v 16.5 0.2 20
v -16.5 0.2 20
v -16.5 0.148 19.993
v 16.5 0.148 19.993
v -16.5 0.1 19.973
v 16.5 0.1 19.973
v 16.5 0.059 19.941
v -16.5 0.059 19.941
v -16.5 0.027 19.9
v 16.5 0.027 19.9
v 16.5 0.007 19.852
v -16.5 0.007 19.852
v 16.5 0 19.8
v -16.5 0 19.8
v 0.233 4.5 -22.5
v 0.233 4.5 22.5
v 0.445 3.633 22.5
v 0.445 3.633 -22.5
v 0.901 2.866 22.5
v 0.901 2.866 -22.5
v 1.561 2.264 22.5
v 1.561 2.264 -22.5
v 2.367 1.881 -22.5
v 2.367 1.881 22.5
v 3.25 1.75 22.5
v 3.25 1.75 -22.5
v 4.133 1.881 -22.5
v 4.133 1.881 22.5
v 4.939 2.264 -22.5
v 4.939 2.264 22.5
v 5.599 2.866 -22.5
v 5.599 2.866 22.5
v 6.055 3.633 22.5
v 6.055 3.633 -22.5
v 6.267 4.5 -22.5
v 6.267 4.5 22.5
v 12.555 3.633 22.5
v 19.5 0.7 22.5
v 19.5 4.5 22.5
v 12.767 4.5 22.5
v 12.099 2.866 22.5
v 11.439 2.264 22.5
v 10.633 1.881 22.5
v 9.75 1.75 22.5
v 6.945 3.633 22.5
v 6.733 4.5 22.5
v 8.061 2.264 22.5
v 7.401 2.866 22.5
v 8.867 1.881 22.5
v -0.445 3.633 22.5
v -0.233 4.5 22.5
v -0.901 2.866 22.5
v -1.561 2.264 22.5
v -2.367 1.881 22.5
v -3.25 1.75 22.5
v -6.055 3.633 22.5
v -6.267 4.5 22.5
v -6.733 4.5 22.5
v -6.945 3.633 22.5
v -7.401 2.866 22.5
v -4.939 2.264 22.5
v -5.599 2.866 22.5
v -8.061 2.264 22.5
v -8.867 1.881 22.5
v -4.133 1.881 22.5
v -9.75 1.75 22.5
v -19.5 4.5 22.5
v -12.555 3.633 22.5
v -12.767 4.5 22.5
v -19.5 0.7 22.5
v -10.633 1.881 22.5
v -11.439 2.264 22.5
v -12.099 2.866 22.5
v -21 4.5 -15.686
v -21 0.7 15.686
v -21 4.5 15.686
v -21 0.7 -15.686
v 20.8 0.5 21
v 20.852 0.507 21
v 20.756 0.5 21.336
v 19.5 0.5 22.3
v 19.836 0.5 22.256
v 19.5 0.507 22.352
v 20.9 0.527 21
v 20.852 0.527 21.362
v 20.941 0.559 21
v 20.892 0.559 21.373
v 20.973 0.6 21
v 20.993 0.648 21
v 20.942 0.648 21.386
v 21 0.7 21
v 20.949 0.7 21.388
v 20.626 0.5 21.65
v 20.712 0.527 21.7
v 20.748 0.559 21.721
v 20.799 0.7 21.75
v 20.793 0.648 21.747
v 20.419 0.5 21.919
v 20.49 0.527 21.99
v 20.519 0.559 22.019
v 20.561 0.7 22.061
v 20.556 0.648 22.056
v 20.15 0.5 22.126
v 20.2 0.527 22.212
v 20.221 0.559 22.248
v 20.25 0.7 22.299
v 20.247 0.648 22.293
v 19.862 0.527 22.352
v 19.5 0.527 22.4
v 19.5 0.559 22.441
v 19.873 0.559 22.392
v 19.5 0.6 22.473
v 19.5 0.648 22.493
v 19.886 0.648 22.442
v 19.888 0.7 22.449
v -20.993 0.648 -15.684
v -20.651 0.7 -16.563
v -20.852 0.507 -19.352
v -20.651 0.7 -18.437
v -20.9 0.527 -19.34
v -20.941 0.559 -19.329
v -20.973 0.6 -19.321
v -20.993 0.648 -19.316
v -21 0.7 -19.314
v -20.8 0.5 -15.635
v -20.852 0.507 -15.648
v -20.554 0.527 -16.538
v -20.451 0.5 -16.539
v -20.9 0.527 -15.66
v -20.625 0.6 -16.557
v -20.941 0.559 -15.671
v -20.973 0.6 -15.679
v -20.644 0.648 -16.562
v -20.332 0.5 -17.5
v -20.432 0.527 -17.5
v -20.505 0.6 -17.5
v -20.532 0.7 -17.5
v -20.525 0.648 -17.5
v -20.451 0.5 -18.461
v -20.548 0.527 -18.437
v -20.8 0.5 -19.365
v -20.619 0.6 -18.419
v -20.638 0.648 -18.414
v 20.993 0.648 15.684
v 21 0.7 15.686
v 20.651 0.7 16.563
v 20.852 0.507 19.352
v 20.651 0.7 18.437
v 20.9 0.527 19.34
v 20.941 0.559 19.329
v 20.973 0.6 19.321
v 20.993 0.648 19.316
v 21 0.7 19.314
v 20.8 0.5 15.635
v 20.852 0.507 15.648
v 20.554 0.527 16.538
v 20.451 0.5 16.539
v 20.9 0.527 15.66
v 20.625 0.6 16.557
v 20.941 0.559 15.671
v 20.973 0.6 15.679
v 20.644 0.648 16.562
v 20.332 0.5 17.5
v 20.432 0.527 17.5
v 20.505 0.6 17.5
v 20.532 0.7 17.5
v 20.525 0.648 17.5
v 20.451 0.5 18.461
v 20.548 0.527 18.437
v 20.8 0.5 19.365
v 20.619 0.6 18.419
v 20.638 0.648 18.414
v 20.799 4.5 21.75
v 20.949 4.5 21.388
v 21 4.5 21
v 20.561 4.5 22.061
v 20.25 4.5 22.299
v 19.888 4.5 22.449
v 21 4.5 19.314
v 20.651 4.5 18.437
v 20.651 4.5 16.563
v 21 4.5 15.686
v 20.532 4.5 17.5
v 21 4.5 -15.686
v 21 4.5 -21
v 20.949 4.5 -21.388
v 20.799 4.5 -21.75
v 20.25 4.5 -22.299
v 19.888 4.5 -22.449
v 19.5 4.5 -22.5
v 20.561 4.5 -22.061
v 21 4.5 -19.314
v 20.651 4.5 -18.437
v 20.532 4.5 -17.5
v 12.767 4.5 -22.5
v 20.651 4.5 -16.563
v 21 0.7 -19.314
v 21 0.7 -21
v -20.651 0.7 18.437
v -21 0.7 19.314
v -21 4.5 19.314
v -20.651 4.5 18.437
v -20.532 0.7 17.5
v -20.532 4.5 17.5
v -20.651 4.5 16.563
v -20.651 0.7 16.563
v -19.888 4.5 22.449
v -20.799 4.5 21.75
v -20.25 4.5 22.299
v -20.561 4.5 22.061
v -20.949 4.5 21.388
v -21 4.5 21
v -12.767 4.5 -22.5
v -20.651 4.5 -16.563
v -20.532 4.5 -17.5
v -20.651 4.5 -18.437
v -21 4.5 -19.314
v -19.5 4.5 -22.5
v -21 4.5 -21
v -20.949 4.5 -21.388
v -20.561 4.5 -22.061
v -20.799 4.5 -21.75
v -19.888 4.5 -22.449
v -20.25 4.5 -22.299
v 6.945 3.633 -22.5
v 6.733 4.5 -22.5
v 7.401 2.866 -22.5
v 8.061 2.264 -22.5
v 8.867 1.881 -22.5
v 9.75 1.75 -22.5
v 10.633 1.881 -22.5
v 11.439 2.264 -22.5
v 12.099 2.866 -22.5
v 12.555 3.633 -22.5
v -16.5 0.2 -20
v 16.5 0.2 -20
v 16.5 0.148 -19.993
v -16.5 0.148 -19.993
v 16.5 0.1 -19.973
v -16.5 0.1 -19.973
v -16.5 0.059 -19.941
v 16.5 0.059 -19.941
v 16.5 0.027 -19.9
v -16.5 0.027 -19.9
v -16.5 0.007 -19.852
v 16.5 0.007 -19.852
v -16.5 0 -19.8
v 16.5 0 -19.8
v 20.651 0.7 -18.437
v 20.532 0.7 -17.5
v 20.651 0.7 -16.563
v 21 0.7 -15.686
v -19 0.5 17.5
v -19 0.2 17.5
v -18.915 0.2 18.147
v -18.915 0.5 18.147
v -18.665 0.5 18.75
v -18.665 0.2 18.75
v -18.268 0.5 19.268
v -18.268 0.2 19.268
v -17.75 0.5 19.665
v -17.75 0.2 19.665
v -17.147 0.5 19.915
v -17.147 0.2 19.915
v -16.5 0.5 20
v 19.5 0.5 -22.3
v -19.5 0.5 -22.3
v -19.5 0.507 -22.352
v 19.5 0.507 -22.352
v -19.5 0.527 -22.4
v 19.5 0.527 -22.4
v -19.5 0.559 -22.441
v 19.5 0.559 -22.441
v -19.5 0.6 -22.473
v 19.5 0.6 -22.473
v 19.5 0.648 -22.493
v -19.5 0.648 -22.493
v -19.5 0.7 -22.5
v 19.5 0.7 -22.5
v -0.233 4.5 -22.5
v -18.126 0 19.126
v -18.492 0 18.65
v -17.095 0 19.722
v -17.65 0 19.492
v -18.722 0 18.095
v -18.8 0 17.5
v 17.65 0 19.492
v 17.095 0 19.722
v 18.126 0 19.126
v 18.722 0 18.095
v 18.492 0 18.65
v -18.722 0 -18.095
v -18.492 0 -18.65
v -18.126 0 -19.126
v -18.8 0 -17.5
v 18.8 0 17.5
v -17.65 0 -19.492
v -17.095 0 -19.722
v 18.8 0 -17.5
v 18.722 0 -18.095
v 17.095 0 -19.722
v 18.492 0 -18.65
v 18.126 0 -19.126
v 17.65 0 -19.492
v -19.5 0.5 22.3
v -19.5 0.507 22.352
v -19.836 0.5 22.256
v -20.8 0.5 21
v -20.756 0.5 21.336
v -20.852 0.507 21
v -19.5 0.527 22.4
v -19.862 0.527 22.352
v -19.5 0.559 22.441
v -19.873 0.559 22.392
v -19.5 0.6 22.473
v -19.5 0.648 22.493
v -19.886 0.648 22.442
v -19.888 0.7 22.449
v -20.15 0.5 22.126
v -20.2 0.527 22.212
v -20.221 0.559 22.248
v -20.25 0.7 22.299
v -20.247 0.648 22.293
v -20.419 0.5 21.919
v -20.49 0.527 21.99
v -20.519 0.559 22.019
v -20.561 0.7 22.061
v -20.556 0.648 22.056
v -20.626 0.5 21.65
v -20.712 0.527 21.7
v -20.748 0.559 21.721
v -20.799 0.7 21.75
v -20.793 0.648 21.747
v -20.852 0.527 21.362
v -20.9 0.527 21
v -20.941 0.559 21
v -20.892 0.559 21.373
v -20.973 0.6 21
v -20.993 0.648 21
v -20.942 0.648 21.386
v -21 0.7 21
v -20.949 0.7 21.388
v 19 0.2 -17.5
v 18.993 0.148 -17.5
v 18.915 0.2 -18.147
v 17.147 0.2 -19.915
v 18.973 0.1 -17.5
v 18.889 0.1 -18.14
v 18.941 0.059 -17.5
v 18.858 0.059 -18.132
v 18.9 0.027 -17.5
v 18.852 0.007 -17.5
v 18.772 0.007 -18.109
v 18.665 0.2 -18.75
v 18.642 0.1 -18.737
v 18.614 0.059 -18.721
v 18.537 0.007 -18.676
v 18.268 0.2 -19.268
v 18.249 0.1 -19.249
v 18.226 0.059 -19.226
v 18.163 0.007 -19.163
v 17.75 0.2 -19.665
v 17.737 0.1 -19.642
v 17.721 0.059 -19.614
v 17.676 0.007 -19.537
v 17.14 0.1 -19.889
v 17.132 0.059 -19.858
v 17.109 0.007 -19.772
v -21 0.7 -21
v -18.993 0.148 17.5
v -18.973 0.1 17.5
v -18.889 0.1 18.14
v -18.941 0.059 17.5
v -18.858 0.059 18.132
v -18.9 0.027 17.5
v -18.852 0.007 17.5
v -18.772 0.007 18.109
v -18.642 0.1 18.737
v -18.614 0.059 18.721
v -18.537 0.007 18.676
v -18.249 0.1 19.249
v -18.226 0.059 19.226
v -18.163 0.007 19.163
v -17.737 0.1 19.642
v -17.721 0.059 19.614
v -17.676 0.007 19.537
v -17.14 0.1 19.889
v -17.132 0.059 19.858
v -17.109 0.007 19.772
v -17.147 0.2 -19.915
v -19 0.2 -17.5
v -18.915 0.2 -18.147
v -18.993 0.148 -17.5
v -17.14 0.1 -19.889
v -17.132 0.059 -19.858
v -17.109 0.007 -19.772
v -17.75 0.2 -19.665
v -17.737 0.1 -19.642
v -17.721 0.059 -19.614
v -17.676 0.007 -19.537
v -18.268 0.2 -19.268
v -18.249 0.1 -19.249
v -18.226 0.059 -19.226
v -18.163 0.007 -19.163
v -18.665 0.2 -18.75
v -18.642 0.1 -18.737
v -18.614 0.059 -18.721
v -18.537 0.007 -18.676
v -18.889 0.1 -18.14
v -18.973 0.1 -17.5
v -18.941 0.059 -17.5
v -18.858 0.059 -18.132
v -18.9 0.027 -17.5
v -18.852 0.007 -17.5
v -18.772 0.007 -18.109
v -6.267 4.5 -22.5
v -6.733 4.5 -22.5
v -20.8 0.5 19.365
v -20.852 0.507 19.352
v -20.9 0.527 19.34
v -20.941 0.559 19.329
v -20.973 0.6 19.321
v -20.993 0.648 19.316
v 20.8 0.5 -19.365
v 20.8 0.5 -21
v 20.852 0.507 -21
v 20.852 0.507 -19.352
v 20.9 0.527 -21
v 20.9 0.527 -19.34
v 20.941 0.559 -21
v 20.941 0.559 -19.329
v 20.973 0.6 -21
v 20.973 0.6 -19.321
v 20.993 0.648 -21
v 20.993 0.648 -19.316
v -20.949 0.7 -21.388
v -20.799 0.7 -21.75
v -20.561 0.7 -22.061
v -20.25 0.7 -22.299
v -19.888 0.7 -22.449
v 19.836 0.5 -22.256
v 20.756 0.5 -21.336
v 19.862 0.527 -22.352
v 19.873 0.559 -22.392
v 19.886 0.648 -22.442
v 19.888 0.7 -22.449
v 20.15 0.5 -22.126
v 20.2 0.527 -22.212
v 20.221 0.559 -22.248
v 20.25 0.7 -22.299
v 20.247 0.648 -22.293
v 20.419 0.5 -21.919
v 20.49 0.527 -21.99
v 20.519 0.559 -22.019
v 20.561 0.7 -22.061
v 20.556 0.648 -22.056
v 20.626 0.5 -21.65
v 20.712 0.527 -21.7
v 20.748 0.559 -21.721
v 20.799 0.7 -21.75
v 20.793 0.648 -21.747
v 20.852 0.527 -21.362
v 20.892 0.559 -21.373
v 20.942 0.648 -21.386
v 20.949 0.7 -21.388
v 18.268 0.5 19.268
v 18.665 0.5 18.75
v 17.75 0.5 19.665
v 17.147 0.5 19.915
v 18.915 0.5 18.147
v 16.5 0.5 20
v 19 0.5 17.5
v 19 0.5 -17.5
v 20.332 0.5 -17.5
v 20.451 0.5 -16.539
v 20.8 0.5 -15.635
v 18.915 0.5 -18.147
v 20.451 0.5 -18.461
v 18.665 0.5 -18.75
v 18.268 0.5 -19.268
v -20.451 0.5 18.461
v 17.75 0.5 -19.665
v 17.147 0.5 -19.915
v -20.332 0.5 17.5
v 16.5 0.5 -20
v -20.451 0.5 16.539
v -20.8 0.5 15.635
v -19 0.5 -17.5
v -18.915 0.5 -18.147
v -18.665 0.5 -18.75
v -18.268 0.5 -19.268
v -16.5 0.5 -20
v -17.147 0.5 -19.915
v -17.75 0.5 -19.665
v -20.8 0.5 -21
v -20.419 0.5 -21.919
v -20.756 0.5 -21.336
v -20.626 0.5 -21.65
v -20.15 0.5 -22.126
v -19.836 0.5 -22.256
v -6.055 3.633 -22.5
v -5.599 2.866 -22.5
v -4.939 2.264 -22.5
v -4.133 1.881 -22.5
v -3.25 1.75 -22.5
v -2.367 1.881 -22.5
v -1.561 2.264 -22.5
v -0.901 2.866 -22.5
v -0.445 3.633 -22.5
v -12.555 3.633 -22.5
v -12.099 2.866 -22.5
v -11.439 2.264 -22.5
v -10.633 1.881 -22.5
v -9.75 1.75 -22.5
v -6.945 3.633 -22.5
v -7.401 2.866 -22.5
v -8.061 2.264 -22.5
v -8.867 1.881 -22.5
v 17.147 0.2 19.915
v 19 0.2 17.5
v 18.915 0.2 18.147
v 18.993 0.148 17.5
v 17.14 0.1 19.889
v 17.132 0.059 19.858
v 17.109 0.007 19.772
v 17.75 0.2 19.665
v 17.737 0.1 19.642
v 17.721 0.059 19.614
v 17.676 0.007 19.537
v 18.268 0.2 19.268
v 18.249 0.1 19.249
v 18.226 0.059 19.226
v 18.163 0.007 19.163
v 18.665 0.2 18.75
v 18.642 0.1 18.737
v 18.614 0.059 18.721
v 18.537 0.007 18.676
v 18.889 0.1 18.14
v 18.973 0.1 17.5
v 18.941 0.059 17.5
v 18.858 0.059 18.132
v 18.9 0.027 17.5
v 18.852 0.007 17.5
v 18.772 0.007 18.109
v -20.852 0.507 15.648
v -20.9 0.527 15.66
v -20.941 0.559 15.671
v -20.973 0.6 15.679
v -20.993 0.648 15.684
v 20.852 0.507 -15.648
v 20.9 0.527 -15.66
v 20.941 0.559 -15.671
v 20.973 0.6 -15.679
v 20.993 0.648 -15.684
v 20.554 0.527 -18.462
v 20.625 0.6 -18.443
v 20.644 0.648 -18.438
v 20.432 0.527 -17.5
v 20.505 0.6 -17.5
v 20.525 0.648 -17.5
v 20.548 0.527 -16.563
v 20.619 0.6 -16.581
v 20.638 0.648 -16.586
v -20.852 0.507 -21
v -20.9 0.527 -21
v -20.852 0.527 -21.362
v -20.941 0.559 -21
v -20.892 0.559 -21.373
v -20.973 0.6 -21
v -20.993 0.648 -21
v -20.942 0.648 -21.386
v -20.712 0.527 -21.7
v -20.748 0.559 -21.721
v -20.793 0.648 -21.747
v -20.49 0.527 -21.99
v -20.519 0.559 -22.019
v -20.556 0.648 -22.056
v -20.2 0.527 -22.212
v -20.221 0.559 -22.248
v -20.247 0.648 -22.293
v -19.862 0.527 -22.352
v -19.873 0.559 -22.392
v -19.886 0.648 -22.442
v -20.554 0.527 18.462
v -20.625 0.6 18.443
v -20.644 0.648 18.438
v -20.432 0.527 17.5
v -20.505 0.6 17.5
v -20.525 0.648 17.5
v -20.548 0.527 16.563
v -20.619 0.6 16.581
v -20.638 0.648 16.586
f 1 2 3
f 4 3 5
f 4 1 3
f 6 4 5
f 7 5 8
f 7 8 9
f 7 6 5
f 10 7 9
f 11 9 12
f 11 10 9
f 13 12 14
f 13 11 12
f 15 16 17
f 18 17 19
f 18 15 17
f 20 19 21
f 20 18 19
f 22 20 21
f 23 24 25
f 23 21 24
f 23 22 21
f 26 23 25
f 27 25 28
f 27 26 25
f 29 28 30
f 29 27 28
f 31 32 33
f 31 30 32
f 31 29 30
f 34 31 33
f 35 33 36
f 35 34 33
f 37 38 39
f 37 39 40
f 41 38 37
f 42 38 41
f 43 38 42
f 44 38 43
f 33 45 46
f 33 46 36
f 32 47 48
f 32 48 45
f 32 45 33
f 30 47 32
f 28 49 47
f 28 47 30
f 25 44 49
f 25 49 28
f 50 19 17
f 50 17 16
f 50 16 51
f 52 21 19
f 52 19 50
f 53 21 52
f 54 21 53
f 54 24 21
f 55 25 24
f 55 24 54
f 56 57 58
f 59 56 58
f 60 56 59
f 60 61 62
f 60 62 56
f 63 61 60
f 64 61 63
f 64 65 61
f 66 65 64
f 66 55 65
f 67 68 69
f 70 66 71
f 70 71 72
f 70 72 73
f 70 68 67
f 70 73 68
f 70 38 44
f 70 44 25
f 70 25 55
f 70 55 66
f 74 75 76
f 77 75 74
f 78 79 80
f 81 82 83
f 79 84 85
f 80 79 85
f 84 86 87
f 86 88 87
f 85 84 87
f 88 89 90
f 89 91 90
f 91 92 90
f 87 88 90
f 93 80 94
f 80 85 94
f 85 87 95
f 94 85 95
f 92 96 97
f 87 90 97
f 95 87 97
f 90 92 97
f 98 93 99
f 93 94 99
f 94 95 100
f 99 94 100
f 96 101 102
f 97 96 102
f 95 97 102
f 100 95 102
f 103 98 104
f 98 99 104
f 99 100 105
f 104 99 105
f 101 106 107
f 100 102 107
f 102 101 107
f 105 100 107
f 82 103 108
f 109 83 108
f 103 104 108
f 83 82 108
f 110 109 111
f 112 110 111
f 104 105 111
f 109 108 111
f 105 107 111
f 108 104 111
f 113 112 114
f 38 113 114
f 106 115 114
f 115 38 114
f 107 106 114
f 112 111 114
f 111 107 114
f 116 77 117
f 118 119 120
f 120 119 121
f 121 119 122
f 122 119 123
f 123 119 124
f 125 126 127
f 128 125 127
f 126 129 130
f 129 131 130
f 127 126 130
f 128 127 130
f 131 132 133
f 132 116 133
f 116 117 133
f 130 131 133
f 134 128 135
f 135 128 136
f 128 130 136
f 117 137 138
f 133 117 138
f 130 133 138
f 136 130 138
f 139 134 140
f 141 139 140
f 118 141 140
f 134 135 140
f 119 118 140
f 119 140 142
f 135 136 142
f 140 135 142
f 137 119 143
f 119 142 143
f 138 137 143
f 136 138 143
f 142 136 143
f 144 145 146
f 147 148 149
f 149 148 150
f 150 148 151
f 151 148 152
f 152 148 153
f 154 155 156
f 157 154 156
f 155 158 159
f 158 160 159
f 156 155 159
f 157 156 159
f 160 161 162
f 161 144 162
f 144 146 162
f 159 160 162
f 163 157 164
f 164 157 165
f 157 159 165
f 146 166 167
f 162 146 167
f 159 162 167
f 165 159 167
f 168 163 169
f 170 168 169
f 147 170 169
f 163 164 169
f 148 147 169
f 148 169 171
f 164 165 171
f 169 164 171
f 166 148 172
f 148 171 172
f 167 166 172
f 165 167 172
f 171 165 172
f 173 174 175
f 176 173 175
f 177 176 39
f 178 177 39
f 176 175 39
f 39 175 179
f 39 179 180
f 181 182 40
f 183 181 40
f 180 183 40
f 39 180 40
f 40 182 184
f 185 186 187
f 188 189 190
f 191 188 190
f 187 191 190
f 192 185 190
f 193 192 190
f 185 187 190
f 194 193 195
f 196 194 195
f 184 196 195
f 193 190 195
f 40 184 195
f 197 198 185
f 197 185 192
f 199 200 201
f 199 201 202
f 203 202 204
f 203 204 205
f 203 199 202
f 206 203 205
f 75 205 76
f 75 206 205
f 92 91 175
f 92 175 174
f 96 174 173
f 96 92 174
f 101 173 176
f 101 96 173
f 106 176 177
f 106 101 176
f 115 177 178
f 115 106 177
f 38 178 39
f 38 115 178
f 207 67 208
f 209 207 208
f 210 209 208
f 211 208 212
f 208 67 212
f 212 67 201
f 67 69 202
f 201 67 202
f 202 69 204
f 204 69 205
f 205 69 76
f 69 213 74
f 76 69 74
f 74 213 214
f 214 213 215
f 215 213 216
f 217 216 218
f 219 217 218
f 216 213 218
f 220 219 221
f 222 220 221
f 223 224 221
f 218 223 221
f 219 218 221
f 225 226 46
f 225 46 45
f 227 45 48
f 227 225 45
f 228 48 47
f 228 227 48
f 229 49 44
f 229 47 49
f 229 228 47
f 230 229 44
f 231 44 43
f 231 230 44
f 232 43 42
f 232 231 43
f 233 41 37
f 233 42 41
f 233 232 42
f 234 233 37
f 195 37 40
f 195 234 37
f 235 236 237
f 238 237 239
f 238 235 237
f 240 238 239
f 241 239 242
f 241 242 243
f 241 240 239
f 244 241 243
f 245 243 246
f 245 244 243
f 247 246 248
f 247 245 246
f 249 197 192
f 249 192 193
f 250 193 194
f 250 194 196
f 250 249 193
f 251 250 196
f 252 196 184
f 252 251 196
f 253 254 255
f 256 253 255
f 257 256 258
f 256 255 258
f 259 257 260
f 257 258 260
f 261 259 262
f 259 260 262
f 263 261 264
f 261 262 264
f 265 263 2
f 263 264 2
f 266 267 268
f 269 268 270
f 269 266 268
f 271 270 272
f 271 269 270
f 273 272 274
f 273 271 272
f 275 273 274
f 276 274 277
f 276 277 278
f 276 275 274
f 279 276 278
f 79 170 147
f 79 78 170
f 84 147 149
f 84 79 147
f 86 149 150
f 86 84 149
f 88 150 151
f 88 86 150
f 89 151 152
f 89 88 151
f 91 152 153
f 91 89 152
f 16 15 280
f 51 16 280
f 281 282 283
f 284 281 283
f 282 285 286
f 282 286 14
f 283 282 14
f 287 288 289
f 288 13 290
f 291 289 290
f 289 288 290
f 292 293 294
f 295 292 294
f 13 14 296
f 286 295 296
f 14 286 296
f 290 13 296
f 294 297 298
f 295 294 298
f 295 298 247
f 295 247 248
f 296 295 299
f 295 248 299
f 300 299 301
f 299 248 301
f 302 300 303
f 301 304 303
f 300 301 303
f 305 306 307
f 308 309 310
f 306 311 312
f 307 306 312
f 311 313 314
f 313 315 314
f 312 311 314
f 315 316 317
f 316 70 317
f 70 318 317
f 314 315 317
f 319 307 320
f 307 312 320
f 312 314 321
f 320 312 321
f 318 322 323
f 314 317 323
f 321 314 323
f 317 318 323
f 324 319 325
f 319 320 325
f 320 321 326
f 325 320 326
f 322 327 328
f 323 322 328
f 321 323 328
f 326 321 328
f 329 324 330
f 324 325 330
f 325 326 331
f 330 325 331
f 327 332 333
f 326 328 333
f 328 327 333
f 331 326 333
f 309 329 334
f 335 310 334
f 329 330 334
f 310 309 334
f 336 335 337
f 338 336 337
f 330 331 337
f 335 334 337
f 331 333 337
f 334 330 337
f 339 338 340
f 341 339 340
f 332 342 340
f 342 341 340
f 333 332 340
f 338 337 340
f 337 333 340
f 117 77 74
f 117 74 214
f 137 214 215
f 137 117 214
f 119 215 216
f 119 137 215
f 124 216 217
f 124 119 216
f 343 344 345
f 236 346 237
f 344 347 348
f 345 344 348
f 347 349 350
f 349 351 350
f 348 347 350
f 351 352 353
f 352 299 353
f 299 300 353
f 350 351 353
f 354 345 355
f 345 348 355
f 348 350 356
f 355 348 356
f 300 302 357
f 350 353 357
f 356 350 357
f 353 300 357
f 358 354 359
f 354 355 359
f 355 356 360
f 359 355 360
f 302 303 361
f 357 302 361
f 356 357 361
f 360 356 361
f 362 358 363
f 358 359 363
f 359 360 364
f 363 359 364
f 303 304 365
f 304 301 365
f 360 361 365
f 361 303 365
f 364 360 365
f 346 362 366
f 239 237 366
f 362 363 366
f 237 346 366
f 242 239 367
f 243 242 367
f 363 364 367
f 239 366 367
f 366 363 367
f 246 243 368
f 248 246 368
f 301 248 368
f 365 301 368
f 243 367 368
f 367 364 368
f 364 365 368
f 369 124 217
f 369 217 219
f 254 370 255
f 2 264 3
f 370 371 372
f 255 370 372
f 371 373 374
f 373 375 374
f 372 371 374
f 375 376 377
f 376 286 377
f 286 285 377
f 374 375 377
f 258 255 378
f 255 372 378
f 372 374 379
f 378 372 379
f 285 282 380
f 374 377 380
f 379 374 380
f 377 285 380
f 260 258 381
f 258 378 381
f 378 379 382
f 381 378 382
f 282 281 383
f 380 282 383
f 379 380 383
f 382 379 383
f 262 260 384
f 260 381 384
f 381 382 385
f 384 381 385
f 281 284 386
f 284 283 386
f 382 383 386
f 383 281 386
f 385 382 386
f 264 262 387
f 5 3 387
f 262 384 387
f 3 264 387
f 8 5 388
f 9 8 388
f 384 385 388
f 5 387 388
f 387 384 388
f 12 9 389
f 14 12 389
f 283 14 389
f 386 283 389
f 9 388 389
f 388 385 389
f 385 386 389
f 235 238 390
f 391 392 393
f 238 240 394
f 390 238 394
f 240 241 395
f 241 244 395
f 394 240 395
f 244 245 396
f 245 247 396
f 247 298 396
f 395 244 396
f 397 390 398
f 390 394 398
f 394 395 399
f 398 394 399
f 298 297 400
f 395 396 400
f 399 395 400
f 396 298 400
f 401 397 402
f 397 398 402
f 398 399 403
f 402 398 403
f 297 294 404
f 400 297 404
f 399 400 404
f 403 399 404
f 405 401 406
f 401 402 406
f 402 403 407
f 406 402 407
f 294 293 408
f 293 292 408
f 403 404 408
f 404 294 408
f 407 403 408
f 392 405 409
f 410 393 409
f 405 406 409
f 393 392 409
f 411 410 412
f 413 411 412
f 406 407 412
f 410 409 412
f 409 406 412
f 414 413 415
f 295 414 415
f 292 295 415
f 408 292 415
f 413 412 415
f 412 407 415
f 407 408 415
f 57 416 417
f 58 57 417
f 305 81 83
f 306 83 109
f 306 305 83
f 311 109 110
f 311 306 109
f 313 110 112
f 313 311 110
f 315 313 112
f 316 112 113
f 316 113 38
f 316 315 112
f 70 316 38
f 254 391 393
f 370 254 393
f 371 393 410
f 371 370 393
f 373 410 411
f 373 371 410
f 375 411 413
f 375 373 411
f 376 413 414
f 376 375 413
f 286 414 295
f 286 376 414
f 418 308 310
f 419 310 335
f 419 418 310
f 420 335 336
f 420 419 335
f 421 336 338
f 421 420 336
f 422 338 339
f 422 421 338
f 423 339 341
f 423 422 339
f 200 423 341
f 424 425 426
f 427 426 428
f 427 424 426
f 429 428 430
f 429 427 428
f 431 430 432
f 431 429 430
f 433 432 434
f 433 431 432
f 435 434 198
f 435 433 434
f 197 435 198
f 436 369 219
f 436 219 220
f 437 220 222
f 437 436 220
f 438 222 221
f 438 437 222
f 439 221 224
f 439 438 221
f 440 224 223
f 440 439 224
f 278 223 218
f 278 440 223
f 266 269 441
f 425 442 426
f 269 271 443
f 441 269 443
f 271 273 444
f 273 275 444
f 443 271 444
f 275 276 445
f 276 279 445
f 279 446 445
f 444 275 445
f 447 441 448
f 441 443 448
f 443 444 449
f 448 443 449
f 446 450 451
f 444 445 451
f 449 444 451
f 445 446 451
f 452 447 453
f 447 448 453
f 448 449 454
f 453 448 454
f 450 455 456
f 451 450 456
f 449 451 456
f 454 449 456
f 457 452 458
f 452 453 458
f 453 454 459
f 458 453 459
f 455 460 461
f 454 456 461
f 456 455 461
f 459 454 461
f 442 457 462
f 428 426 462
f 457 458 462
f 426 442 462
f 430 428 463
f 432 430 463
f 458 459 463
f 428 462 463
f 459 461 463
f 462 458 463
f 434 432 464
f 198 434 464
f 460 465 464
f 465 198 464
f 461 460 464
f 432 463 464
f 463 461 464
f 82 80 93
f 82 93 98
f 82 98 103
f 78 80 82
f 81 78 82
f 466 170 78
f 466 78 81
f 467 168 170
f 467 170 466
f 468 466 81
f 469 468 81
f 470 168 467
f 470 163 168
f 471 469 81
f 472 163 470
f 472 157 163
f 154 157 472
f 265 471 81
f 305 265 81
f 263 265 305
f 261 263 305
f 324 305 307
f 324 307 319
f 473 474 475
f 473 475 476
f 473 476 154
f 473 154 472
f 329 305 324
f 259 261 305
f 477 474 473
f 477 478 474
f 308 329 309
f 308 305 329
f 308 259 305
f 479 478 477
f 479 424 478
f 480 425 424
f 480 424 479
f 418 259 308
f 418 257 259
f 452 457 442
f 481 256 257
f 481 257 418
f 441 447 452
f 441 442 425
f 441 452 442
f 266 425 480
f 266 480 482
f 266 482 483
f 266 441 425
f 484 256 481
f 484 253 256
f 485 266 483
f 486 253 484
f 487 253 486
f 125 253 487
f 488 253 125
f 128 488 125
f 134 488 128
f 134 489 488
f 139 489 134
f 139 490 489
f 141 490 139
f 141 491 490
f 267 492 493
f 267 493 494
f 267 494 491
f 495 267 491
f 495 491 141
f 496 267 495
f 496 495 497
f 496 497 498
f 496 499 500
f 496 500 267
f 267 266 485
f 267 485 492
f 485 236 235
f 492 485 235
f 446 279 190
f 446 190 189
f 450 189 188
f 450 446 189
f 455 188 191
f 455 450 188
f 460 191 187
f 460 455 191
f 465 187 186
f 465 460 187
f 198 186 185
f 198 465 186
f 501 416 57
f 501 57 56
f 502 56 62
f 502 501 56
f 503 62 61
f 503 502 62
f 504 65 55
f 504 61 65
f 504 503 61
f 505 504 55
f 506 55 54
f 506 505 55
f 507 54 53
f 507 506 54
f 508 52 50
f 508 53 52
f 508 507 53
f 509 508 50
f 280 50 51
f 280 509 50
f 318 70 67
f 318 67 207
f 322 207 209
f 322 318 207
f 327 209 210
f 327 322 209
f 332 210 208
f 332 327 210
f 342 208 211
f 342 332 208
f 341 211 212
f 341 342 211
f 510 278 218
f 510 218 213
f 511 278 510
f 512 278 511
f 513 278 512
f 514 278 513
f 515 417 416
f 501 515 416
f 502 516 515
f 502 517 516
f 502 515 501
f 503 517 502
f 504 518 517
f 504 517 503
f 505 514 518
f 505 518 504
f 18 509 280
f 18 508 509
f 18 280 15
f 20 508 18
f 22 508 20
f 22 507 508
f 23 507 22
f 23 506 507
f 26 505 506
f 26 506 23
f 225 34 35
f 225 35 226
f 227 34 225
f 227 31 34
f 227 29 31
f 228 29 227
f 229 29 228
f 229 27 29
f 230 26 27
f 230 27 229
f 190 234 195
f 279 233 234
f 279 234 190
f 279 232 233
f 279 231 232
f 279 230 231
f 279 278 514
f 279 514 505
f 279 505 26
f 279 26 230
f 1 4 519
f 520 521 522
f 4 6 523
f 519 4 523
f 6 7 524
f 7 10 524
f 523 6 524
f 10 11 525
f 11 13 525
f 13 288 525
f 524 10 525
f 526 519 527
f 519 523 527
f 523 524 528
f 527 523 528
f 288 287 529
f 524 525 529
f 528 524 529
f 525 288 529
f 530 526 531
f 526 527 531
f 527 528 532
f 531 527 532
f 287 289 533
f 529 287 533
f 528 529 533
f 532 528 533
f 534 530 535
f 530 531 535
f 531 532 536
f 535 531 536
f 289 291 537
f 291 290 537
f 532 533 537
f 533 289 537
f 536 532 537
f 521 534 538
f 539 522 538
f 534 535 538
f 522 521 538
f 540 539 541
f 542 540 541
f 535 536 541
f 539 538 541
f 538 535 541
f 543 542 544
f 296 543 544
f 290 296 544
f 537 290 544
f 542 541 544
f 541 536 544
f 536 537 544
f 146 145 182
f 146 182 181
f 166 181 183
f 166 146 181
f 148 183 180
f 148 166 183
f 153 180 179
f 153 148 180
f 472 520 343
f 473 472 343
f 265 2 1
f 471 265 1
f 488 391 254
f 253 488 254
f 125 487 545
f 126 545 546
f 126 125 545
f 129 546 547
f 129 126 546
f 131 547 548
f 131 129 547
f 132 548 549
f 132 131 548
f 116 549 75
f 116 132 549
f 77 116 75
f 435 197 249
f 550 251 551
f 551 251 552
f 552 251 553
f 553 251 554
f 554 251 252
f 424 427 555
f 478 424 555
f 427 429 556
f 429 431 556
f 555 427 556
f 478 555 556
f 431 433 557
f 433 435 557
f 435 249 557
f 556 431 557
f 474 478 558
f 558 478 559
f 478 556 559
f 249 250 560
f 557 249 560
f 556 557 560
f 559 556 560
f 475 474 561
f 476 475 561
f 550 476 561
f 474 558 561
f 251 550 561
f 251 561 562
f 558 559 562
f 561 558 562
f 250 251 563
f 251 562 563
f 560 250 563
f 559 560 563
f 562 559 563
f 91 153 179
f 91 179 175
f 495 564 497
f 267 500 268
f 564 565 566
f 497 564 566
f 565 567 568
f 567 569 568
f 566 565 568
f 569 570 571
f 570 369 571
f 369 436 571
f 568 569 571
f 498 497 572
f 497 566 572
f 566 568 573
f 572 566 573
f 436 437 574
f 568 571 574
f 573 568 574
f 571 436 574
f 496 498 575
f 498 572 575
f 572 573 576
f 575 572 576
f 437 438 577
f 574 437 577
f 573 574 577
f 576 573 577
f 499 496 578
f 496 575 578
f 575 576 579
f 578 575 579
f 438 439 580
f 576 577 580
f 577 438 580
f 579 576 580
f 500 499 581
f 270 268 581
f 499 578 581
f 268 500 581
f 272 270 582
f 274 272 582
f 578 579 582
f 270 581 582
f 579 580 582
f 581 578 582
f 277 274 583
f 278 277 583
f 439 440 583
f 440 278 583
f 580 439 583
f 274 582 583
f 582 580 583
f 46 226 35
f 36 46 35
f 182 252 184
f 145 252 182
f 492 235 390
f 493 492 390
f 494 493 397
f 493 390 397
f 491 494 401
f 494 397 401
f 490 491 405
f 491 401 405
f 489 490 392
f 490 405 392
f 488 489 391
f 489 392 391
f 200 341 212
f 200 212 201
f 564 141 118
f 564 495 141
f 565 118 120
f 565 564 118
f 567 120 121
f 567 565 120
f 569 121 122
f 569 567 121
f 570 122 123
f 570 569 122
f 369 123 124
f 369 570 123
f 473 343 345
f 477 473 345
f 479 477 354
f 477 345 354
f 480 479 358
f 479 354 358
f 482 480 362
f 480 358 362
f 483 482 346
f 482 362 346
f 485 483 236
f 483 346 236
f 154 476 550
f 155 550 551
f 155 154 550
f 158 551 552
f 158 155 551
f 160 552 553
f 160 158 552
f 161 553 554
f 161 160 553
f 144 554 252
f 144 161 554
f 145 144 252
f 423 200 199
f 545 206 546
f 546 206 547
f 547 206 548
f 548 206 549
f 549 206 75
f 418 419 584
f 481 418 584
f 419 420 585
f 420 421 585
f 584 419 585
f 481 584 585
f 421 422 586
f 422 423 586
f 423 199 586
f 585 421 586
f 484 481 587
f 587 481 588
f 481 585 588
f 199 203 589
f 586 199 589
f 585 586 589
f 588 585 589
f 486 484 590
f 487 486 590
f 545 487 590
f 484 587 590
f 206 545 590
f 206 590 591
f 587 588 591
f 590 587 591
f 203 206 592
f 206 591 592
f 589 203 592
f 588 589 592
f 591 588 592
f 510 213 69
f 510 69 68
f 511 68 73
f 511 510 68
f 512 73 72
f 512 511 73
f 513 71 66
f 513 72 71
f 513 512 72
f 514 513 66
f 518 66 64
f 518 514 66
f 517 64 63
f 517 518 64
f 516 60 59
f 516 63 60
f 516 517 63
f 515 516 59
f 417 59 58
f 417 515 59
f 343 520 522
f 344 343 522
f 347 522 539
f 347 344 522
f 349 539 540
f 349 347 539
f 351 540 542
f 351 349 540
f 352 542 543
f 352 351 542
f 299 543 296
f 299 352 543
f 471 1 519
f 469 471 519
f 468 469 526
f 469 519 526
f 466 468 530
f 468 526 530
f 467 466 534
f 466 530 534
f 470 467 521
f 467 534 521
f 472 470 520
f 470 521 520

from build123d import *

# Parameters (mm, degrees)
BOSS_EXTRUDE1_DEPTH     = 0.5
BOSS_EXTRUDE2_DEPTH     = 4
FILLET1_R               = 0.2
CUT_EXTRUDE1_DEPTH      = 32.104662098
CUT_EXTRUDE1_DEPTH_BACK = 32.104662098
SKETCH3_R               = 3.03


with BuildPart() as part:
    # Sketch1 → Boss-Extrude1 (new body)
    with BuildSketch(Plane(origin=(0, 0, 0), x_dir=(1, 0, 0), z_dir=(0, 1, 0))):
        with BuildLine():
            Line((-19, 17.5), (-19, -17.5))
            ThreePointArc((-19, -17.5), (-18.267766953, -19.267766953), (-16.5, -20))
            Line((-16.5, -20), (16.5, -20))
            ThreePointArc((16.5, -20), (18.267766953, -19.267766953), (19, -17.5))
            Line((19, -17.5), (19, 17.5))
            ThreePointArc((19, 17.5), (18.267766953, 19.267766953), (16.5, 20))
            Line((16.5, 20), (-16.5, 20))
            ThreePointArc((-16.5, 20), (-18.267766953, 19.267766953), (-19, 17.5))
        make_face()
    extrude(amount=BOSS_EXTRUDE1_DEPTH)

    # Sketch2 → Boss-Extrude2 (add)
    with BuildSketch(Plane(origin=(0, 0.5, 0), x_dir=(1, 0, 0), z_dir=(0, 1, 0))):
        with BuildLine():
            Line((-19.5, 22.5), (19.5, 22.5))
            ThreePointArc((19.5, 22.5), (20.560660172, 22.060660172), (21, 21))
            Line((21, 21), (21, 19.314104738))
            ThreePointArc((21, 19.314104738), (20.532, 17.5), (21, 15.685895262))
            Line((21, 15.685895262), (21, -15.685895262))
            ThreePointArc((21, -15.685895262), (20.532, -17.5), (21, -19.314104738))
            Line((21, -19.314104738), (21, -21))
            ThreePointArc((21, -21), (20.560660172, -22.060660172), (19.5, -22.5))
            Line((19.5, -22.5), (-19.5, -22.5))
            ThreePointArc((-19.5, -22.5), (-20.560660172, -22.060660172), (-21, -21))
            Line((-21, -21), (-21, -19.314104738))
            ThreePointArc((-21, -19.314104738), (-20.532, -17.5), (-21, -15.685895262))
            Line((-21, -15.685895262), (-21, 15.685895262))
            ThreePointArc((-21, 15.685895262), (-20.532, 17.5), (-21, 19.314104738))
            Line((-21, 19.314104738), (-21, 21))
            ThreePointArc((-21, 21), (-20.560660172, 22.060660172), (-19.5, 22.5))
        make_face()
    extrude(amount=BOSS_EXTRUDE2_DEPTH)

    # Fillet1
    fillet1_edges = [part.edges().sort_by_distance(p)[0] for p in [
        (0, 0, 20),
        (-18.267766953, 0, 19.267766953),
        (-20.532, 0.5, 17.5),
        (-21, 0.5, 20.157052369),
        (-20.560660172, 0.5, 22.060660172),
        (0, 0.5, 22.5),
        (20.560660172, 0.5, 22.060660172),
        (21, 0.5, 20.157052369),
        (20.532, 0.5, 17.5),
        (21, 0.5, 0),
        (20.532, 0.5, -17.5),
        (21, 0.5, -20.157052369),
        (20.560660172, 0.5, -22.060660172),
        (0, 0.5, -22.5),
        (-20.560660172, 0.5, -22.060660172),
        (-21, 0.5, -20.157052369),
        (-20.532, 0.5, -17.5),
        (-21, 0.5, 0),
        (-19, 0, 0),
        (-18.267766953, 0, -19.267766953),
        (0, 0, -20),
        (18.267766953, 0, -19.267766953),
        (19, 0, 0),
        (18.267766953, 0, 19.267766953),
    ]]
    fillet(fillet1_edges, radius=FILLET1_R)

    # Sketch3 → Cut-Extrude1 (cut, two sides: drawn at the far end of the back side and taken through both)
    with BuildSketch(Plane.XY.offset(-CUT_EXTRUDE1_DEPTH_BACK)):
        with Locations((9.75, 4.78)):
            Circle(SKETCH3_R)
        with Locations((3.25, 4.78)):
            Circle(SKETCH3_R)
        with Locations((-3.25, 4.78)):
            Circle(SKETCH3_R)
        with Locations((-9.75, 4.78)):
            Circle(SKETCH3_R)
    extrude(amount=CUT_EXTRUDE1_DEPTH + CUT_EXTRUDE1_DEPTH_BACK, mode=Mode.SUBTRACT)


solid = part.part
